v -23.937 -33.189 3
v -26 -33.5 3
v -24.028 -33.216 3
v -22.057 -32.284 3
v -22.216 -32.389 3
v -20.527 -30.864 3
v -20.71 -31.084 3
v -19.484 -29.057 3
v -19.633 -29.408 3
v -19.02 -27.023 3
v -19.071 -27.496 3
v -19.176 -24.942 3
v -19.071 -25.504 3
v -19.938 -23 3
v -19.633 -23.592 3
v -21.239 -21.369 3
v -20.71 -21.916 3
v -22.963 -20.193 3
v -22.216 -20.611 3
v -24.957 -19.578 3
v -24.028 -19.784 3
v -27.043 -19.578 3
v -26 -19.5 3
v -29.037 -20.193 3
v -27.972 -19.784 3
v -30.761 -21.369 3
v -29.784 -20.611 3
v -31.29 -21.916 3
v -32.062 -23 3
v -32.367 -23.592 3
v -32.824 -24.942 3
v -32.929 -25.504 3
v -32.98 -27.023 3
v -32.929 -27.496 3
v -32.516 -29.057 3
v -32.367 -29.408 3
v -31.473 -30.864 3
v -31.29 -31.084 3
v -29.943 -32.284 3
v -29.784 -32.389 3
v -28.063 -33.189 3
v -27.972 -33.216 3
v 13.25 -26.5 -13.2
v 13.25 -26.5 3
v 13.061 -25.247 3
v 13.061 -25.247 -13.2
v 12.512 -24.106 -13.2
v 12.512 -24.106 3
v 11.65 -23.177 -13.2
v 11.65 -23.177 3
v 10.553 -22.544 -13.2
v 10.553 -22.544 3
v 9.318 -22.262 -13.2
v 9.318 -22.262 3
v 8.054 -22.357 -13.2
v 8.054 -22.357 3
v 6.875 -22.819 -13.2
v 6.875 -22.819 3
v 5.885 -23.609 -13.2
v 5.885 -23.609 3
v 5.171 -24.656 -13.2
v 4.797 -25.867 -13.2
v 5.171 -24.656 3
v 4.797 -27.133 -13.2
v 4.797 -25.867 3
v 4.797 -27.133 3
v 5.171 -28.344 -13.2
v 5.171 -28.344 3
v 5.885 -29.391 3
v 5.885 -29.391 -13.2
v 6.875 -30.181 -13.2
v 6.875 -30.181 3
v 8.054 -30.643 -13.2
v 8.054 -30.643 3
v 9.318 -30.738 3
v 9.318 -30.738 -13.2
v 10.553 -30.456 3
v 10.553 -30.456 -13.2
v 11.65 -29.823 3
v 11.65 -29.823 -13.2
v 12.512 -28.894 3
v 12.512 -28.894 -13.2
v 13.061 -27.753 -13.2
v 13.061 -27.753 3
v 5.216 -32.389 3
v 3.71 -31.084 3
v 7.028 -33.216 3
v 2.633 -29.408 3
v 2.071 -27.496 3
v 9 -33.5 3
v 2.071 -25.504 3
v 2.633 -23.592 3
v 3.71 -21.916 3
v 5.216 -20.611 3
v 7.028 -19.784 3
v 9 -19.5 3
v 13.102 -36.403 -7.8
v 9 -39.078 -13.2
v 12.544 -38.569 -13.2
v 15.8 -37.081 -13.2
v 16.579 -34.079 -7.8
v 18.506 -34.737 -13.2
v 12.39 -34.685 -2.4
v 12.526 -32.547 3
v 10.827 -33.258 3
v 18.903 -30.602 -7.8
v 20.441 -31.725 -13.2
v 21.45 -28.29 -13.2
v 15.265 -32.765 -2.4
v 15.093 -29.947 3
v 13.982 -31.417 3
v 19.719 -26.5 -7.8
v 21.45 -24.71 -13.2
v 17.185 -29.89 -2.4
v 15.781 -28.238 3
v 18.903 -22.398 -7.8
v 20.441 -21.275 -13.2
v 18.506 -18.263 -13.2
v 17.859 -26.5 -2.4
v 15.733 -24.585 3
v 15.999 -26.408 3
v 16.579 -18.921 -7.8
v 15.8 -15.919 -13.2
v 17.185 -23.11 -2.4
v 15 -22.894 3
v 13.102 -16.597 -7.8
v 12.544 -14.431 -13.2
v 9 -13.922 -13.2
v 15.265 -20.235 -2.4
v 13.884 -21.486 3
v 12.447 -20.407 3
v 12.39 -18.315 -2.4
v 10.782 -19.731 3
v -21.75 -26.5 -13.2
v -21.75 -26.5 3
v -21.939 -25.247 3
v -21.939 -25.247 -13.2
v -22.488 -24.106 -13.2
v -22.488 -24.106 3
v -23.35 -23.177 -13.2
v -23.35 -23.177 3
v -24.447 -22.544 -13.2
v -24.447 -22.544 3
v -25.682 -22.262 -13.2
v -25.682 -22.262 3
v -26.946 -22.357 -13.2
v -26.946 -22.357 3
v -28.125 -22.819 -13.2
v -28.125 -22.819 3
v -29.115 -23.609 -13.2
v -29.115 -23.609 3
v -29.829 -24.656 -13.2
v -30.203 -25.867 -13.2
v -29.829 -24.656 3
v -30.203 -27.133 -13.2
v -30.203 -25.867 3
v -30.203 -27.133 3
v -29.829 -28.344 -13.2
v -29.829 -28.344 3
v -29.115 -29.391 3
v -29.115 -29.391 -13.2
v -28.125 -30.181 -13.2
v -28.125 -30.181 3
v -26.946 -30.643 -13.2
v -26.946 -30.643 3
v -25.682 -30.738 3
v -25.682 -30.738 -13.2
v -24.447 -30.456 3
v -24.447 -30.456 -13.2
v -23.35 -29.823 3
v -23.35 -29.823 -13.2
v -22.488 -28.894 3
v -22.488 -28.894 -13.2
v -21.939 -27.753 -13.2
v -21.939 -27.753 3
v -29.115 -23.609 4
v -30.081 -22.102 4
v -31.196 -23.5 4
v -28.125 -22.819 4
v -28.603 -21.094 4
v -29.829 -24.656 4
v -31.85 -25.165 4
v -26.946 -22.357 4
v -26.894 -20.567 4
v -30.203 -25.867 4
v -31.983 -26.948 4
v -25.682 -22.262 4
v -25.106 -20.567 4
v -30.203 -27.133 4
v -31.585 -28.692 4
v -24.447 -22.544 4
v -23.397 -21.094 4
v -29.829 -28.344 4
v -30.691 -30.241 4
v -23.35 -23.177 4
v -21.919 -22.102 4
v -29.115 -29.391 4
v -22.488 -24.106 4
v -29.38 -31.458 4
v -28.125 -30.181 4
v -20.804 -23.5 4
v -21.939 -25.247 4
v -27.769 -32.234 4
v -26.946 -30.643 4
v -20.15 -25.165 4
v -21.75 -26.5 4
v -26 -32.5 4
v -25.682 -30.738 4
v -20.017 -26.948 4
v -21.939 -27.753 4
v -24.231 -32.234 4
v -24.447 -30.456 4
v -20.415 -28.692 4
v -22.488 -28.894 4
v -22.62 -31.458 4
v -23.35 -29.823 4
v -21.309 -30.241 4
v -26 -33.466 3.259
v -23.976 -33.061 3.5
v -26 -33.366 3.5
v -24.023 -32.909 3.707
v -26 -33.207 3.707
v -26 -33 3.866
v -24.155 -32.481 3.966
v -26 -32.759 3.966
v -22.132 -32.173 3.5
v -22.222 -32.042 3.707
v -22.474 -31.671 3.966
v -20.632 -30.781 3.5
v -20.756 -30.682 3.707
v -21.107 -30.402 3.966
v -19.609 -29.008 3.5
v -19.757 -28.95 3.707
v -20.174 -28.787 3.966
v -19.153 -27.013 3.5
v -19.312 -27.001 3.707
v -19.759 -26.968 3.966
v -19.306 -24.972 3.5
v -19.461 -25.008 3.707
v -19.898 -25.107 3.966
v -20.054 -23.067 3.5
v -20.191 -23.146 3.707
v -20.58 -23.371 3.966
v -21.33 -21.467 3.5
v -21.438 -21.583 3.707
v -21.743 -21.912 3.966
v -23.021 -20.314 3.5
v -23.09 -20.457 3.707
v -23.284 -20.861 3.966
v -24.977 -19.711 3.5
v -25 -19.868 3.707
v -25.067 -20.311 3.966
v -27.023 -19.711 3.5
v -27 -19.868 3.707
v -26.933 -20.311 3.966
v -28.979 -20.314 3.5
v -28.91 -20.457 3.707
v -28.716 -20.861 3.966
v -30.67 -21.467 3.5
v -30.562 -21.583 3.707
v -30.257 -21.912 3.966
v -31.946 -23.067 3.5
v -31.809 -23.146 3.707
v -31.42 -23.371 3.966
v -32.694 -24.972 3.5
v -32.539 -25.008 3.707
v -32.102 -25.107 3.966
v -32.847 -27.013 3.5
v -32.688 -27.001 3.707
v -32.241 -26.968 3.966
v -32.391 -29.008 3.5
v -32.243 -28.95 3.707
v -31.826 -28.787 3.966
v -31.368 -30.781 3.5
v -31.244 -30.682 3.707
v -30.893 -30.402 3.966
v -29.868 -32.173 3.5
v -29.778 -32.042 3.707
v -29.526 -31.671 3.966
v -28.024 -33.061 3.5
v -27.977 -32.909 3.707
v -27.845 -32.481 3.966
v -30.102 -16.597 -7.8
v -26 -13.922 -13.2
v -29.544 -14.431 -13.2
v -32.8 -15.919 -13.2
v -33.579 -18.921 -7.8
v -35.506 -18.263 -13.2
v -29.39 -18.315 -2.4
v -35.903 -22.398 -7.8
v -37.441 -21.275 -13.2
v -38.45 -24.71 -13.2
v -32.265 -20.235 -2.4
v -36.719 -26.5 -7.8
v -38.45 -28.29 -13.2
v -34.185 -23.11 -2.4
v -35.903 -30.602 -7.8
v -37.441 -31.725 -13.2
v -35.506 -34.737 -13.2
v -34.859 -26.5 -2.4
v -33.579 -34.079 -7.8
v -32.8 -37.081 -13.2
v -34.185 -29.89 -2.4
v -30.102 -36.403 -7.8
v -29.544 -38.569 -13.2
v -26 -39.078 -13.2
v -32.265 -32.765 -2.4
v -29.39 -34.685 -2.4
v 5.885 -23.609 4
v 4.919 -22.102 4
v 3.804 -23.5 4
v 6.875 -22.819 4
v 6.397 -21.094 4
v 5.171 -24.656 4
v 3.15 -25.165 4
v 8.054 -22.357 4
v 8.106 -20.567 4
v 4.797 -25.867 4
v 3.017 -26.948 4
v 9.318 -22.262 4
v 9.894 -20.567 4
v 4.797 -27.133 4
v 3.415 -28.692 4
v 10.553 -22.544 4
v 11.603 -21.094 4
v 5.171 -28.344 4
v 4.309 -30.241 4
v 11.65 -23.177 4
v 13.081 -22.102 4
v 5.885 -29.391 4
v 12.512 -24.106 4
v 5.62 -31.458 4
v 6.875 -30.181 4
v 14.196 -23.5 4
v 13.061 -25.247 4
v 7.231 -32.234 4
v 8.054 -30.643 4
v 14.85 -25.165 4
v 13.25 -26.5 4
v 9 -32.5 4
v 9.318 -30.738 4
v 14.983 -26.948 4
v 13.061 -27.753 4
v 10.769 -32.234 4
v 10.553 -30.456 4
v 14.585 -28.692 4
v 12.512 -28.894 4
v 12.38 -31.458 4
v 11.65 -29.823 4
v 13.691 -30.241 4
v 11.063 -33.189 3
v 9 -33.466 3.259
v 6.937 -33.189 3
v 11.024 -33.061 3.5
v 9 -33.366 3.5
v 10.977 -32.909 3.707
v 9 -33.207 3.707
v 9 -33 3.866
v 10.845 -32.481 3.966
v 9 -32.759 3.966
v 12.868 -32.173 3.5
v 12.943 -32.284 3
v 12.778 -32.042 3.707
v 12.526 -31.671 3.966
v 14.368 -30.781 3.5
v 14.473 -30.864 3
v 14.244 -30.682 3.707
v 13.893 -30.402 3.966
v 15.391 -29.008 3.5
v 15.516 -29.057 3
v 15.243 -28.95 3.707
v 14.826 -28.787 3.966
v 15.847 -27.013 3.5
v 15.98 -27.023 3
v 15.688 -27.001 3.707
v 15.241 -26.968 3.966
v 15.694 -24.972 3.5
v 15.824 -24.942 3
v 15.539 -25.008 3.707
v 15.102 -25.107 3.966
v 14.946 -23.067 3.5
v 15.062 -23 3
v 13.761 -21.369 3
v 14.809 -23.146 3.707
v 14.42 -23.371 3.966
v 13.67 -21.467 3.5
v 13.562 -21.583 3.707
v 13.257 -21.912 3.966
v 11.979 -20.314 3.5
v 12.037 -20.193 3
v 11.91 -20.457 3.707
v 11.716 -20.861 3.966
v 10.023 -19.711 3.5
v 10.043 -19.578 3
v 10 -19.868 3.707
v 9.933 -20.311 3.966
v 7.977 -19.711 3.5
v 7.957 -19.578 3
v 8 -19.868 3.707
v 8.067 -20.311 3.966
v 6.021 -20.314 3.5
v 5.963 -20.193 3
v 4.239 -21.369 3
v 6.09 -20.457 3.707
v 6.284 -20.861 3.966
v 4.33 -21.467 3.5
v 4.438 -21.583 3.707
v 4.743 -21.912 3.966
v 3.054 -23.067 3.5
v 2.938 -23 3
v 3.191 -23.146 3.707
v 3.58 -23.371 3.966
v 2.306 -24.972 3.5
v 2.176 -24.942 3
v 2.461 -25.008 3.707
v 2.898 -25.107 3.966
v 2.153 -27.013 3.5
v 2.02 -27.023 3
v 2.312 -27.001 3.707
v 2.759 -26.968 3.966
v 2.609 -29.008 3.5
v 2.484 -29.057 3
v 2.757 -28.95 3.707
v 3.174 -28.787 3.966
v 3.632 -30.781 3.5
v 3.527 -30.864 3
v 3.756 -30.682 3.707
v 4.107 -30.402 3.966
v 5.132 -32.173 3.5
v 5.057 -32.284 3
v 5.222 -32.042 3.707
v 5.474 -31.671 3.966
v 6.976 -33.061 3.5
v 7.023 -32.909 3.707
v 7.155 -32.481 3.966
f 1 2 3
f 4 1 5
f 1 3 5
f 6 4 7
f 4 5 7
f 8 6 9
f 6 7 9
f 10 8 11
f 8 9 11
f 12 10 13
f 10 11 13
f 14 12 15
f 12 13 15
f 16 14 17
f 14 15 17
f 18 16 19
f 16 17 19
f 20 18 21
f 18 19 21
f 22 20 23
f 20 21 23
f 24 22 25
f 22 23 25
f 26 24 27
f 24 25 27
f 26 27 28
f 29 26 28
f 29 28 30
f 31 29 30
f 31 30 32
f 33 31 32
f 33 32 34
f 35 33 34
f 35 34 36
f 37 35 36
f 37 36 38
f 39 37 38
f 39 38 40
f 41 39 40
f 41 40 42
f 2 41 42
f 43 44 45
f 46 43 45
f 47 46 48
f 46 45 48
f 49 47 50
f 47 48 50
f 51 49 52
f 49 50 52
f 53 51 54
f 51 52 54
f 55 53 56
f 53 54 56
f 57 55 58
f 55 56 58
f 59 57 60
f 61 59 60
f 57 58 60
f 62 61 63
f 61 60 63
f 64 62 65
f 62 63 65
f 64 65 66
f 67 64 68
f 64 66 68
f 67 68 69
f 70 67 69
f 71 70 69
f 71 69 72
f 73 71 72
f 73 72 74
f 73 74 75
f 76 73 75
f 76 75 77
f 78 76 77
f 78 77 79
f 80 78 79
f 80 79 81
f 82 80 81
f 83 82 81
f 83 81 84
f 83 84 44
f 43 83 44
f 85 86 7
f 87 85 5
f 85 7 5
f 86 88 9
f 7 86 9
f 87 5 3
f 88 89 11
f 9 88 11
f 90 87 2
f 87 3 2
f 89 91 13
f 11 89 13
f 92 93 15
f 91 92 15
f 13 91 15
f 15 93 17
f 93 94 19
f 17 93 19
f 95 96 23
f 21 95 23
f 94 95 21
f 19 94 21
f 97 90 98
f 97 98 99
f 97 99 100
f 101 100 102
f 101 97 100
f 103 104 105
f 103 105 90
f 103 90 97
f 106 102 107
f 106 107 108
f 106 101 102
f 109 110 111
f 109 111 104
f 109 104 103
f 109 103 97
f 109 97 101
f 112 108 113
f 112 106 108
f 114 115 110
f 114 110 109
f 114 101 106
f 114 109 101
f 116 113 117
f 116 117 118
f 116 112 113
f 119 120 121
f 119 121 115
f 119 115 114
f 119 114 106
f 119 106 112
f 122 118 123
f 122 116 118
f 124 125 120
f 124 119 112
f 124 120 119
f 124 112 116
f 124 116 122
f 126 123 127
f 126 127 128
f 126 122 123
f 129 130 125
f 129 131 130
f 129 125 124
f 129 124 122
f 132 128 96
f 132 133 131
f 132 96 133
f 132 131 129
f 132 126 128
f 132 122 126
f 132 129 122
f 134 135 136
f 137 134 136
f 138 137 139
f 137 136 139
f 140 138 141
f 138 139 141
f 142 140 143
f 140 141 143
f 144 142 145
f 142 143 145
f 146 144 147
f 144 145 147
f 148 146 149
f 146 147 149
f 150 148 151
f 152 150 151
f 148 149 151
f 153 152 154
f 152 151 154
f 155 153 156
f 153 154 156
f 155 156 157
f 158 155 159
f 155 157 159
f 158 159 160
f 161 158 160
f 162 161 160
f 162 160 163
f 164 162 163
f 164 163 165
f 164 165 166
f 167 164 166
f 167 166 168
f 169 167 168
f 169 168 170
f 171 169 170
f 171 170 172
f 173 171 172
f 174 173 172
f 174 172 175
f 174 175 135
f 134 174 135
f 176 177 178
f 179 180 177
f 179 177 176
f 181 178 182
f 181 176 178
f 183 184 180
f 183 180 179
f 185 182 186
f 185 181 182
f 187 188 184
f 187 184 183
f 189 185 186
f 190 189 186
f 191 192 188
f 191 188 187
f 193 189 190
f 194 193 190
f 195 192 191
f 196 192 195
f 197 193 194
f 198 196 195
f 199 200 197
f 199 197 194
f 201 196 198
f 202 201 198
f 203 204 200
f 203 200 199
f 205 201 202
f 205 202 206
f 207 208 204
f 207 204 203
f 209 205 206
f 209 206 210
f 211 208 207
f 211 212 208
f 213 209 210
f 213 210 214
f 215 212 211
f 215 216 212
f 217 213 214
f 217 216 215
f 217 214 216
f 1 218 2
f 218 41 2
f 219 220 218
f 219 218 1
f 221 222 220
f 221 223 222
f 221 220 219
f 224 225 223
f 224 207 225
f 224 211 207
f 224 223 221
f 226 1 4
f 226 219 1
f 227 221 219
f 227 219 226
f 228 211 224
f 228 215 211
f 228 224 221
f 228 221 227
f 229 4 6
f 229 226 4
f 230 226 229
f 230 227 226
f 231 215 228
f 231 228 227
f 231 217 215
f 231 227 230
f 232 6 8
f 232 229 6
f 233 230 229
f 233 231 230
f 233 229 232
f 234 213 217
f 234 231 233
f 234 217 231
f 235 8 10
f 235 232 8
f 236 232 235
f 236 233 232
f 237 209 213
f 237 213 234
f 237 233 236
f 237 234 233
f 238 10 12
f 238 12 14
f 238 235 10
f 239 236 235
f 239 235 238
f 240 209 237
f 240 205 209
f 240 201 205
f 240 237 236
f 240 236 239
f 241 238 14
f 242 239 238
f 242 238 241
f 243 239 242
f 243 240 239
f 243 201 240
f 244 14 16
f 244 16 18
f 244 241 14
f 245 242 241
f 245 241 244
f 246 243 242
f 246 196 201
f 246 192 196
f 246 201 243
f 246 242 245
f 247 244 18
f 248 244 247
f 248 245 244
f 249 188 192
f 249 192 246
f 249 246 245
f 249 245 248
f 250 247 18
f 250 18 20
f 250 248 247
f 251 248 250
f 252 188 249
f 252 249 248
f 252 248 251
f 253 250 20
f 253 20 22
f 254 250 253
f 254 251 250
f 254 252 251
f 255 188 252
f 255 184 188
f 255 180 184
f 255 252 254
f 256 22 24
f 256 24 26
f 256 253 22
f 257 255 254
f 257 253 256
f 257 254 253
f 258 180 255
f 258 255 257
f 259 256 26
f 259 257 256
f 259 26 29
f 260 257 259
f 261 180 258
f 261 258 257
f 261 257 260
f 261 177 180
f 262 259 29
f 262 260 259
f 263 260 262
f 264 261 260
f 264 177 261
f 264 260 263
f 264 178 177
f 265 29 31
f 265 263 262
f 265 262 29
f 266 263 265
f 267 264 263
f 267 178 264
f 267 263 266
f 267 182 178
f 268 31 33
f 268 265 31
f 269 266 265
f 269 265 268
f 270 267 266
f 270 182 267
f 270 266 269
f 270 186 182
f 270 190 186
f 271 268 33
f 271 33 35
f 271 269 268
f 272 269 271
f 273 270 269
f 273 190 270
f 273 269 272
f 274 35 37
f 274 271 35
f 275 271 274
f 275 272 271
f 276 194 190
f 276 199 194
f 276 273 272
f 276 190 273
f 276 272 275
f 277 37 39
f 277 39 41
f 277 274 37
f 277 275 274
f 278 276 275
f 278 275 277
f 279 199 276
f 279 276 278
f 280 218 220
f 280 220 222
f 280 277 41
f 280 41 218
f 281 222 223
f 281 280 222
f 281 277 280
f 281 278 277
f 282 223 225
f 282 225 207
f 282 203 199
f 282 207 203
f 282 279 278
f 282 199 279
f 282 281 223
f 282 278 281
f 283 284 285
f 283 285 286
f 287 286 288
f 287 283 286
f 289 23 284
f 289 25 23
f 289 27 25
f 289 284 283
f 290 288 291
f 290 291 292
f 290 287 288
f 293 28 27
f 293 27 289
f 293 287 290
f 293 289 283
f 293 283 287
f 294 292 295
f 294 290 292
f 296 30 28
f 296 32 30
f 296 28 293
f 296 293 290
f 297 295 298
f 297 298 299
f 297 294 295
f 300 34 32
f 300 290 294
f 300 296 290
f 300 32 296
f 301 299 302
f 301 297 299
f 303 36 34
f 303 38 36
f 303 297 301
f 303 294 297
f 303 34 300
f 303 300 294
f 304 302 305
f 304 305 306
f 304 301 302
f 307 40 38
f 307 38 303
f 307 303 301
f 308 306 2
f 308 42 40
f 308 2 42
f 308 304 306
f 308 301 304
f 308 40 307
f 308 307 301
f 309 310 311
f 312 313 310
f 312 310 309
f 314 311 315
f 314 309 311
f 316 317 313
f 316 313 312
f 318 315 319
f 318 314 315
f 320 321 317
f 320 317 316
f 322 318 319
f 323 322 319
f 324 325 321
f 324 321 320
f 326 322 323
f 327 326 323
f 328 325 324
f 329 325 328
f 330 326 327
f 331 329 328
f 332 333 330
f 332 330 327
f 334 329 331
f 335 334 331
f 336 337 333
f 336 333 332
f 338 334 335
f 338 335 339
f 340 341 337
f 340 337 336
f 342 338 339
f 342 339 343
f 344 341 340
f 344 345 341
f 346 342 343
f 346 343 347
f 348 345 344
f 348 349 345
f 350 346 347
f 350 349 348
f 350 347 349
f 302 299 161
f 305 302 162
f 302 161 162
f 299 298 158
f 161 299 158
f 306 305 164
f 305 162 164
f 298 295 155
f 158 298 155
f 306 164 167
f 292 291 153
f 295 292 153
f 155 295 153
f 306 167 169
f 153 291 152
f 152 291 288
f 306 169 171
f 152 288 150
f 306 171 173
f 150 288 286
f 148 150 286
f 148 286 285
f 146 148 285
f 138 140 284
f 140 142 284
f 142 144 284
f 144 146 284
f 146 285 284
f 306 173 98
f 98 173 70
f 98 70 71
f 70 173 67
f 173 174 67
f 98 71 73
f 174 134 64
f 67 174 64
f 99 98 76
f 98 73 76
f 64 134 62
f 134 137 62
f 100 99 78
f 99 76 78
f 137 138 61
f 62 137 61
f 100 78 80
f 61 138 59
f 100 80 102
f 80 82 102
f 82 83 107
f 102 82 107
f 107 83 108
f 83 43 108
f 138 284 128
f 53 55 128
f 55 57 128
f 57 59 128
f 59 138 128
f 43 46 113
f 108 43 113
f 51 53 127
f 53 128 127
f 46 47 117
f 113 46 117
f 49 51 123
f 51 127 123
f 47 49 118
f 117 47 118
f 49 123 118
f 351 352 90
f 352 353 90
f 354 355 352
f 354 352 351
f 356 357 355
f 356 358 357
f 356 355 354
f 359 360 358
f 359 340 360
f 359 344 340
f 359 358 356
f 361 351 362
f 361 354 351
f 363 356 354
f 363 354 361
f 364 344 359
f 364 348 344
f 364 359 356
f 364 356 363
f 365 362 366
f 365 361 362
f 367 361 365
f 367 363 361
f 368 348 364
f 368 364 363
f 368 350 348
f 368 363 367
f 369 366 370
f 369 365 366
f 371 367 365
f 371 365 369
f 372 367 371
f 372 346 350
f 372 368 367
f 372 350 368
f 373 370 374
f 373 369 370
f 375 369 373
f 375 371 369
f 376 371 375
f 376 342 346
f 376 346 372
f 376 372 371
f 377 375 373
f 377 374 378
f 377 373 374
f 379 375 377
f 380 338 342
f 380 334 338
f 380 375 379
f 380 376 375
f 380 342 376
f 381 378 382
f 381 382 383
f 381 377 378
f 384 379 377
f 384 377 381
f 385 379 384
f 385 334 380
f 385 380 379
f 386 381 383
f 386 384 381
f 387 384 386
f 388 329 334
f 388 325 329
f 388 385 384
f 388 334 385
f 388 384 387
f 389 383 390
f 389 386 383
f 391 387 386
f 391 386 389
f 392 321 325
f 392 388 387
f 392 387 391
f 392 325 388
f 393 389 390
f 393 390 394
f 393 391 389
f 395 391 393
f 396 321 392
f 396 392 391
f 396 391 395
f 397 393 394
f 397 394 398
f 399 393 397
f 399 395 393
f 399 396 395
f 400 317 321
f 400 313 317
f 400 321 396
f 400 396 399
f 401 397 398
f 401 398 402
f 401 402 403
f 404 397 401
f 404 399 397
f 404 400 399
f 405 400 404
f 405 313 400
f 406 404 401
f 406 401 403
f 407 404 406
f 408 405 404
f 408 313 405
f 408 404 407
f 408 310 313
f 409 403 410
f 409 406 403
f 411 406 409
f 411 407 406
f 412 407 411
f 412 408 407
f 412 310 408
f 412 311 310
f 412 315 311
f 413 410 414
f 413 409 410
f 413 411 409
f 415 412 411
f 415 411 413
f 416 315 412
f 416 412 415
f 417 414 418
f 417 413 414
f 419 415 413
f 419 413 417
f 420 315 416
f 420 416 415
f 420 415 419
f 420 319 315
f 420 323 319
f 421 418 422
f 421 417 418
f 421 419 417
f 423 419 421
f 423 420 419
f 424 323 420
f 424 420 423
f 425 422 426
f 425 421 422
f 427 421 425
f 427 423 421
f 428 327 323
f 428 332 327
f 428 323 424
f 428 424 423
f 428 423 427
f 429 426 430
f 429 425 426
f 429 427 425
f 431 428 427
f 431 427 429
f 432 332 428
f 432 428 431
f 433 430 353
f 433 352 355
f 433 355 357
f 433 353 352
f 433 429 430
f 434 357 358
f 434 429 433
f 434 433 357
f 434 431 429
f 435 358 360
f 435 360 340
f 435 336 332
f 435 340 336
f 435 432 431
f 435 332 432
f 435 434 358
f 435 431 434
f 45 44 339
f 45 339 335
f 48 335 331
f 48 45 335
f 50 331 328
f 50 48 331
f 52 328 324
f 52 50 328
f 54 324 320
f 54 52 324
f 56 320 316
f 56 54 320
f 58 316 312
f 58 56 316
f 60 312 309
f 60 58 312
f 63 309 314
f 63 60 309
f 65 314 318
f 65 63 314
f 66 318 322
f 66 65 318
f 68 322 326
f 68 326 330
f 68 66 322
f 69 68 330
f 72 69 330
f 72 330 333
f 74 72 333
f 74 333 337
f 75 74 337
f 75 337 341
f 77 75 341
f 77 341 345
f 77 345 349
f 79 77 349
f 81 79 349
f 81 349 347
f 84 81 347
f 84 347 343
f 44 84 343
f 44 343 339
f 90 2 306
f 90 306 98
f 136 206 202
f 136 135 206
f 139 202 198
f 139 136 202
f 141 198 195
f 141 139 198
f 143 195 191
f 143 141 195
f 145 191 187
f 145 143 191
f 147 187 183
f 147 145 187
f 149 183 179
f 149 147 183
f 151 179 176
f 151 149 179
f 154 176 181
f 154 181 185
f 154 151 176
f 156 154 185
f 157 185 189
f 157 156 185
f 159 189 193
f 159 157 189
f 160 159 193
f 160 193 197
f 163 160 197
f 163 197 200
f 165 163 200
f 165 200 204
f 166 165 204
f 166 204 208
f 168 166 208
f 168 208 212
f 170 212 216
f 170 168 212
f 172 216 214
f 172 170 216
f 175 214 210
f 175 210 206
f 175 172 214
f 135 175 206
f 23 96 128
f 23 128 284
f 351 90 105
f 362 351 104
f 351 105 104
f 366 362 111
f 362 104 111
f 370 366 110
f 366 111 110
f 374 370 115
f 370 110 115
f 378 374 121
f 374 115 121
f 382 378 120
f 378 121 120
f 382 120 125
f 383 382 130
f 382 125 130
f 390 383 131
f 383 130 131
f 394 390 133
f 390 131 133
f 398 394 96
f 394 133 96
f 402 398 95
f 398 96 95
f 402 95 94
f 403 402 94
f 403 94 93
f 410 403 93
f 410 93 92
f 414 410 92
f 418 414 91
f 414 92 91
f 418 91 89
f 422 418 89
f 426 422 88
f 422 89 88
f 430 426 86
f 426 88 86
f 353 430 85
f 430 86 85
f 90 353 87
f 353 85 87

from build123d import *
from build123d.topology import SkipClean

# Parameters (mm, degrees)
SKETCH1_R           = 4.25
SKETCH1_W           = 20
SKETCH1_H           = 5
BOSS_EXTRUDE1_DEPTH = 3
SKETCH2_R           = 7
SKETCH2_R_2         = 4.25
BOSS_EXTRUDE2_DEPTH = 1
FILLET1_R           = 1
CUT_EXTRUDE1_DEPTH  = 48.11952886
BOSS_EXTRUDE3_DEPTH = 16.2
BOSS_EXTRUDE3_DRAFT = 19
SKETCH5_R           = 4.25
CUT_EXTRUDE2_DEPTH  = 58.252151387


with BuildPart() as part:
    # Sketch1 → Boss-Extrude1 (new body)
    with BuildSketch(Plane.XY):
        with BuildLine():
            Line((9, -33.5), (-26, -33.5))
            ThreePointArc((-26, -33.5), (-33, -26.5), (-26, -19.5))
            Line((-26, -19.5), (-20, -19.5))
            ThreePointArc((-20, -19.5), (-16.464466094, -18.035533906), (-15, -14.5))
            Line((-15, -14.5), (-15, 28.5))
            ThreePointArc((-15, 28.5), (-13.535533906, 32.035533906), (-10, 33.5))
            Line((-10, 33.5), (10, 33.5))
            ThreePointArc((10, 33.5), (13.535533906, 32.035533906), (15, 28.5))
            Line((15, 28.5), (15, -22.894448725))
            ThreePointArc((15, -22.894448725), (15.092571663, -29.946820352), (9, -33.5))
        make_face()
        with Locations((9, -26.5)):
            Circle(SKETCH1_R, mode=Mode.SUBTRACT)
        with Locations((-26, -26.5)):
            Circle(SKETCH1_R, mode=Mode.SUBTRACT)
        with Locations((0, 26)):
            Rectangle(SKETCH1_W, SKETCH1_H, mode=Mode.SUBTRACT)
    extrude(amount=BOSS_EXTRUDE1_DEPTH)

    # Sketch2 → Boss-Extrude2 (add)
    # profile 1 of 2: a face of its own
    with BuildSketch(Plane.XY.offset(3)):
        with Locations(Location((-26, -26.5, 0), (0, 0, 270))):
            Circle(SKETCH2_R)
        with Locations((-26, -26.5)):
            Circle(SKETCH2_R_2, mode=Mode.SUBTRACT)
    # profile 2 of 2: a face of its own
    with BuildSketch(Plane.XY.offset(3)):
        with Locations(Location((9, -26.5, 0), (0, 0, 270))):
            Circle(SKETCH2_R)
        with Locations((9, -26.5)):
            Circle(SKETCH2_R_2, mode=Mode.SUBTRACT)
    extrude(amount=BOSS_EXTRUDE2_DEPTH)

    # Fillet1
    fillet1_edges = [part.edges().sort_by_distance(p)[0] for p in [
        (-26, -19.5, 4),
        (9, -19.5, 4),
    ]]
    fillet(fillet1_edges, radius=FILLET1_R - 0.0001)  # a hair under: the kernel refuses the full size

    # Sketch3 → Cut-Extrude1 (cut, through all)
    with SkipClean():  # the faces are left unmerged after this step: merging them gives an invalid solid
        with BuildSketch(Plane.XY.offset(3)):
            with BuildLine():
                Line((-20, -19.5), (9, -19.5))
                ThreePointArc((9, -19.5), (12.446820352, -20.407428337), (15, -22.894448725))
                Line((15, -22.894448725), (15, 33.5))
                Line((15, 33.5), (-20, 33.5))
                Line((-20, 33.5), (-20, -19.5))
            make_face()
        extrude(amount=-CUT_EXTRUDE1_DEPTH, mode=Mode.SUBTRACT)


with BuildPart() as boss_extrude3_tool:
    # Sketch4 → Boss-Extrude3 (with draft: the straight prism first)
    with BuildSketch(Plane.XY.offset(3)):
        with BuildLine():
            ThreePointArc((-26, -19.5), (-33, -26.5), (-26, -33.5))
            Line((-26, -33.5), (9, -33.5))
            ThreePointArc((9, -33.5), (16, -26.5), (9, -19.5))
            Line((9, -19.5), (-26, -19.5))
        make_face()
    extrude(amount=-BOSS_EXTRUDE3_DEPTH)
    # Boss-Extrude3: the draft: its side faces are tilted about the plane it starts from
    boss_extrude3_sides = [boss_extrude3_tool.faces().sort_by_distance(p)[0] for p in [
        (-33, -26.5, -5.1),
        (-8.5, -33.5, -5.1),
        (16, -26.5, -5.1),
        (-8.5, -19.5, -5.1),
    ]]
    draft(boss_extrude3_sides, Plane.XY.offset(3), BOSS_EXTRUDE3_DRAFT)


with BuildPart() as part_1:
    add(part.part)

    # Boss-Extrude3: add boss_extrude3_tool
    add(boss_extrude3_tool.part)

    # Sketch5 → Cut-Extrude2 (cut, through all)
    with BuildSketch(Plane.XY.offset(3)):
        with Locations((-26, -26.5)):
            Circle(SKETCH5_R)
        with Locations((9, -26.5)):
            Circle(SKETCH5_R)
    extrude(amount=-CUT_EXTRUDE2_DEPTH, mode=Mode.SUBTRACT)


solid = part_1.part
